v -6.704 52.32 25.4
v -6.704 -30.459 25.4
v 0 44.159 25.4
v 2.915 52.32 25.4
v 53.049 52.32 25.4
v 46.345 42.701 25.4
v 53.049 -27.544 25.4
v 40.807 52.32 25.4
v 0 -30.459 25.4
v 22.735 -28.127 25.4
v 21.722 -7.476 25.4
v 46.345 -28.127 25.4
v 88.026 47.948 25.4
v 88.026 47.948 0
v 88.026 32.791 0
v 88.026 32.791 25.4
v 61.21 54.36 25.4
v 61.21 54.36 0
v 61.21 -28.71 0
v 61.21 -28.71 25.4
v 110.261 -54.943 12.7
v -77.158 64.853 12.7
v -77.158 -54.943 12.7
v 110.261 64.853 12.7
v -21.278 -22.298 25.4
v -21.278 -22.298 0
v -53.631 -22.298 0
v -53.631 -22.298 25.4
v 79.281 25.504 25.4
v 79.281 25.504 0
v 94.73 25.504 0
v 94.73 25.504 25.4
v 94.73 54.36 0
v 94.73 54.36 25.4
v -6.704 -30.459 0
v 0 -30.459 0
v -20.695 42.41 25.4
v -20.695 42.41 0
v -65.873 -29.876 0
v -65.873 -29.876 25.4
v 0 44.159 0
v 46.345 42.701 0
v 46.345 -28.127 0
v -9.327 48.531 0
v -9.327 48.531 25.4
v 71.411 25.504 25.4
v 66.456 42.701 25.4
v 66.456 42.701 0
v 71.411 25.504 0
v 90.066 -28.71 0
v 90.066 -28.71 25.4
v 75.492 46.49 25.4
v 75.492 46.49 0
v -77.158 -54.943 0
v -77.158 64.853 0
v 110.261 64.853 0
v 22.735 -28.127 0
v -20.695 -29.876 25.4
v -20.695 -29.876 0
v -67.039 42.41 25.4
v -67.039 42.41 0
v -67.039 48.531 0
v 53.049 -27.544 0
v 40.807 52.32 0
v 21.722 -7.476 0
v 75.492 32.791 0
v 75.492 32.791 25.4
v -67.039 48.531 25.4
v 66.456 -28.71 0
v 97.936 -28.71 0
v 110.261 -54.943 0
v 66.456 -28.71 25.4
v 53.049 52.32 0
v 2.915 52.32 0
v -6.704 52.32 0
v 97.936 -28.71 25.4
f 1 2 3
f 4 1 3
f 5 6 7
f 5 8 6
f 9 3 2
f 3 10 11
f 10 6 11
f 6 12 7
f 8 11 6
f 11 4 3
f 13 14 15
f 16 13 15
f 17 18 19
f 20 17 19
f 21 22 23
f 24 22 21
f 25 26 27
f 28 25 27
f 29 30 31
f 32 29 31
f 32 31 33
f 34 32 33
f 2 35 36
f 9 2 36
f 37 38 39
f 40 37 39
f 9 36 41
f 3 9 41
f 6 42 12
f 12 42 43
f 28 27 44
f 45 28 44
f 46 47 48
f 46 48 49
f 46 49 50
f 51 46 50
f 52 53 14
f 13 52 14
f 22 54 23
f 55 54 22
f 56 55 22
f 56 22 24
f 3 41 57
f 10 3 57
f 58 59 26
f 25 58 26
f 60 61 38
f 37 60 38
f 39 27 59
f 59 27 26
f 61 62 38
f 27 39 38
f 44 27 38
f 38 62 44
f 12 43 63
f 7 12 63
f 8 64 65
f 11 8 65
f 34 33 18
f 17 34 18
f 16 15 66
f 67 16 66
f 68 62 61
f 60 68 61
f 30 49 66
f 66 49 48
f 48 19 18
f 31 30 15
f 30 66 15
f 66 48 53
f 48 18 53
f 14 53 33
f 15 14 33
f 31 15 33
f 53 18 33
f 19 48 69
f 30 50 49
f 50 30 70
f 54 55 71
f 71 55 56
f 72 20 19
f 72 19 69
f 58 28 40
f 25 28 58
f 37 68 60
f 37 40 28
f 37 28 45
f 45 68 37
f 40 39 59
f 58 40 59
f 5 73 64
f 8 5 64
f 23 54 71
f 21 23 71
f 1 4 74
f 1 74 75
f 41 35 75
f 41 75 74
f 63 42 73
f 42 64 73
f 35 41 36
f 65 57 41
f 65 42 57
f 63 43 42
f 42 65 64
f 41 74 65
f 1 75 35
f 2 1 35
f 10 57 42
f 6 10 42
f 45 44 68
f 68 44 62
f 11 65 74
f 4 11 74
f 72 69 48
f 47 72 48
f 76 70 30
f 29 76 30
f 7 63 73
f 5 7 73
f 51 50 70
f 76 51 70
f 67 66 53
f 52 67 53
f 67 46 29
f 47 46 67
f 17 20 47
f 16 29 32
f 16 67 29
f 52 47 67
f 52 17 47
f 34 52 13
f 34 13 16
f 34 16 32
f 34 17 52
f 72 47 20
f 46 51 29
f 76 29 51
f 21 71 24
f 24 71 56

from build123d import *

# Parameters (mm, degrees)
F3_DEPTH = 25.4
F4_DEPTH = 25.4
F5_DEPTH = 25.4
F6_W     = 187.418692
F6_H     = 119.796396
F7_DEPTH = 12.7


with BuildPart() as f3:
    # F0 (on Top) → F3 (new body)
    with BuildSketch(Plane.XY):
        Polygon((-67.039348, 48.530657), (-67.039348, 42.40967), (-20.694755, 42.40967), (-65.873444, -29.87623), (-20.694755, -29.87623), (-21.277705, -22.297869), (-53.631477, -22.297869), (-9.327213, 48.530657), align=None)
    extrude(amount=F3_DEPTH)


with BuildPart() as f4:
    # F1 (on Top) → F4 (new body)
    with BuildSketch(Plane.XY):
        Polygon((-6.703934, -30.45918), (0, -30.45918), (0, 44.158522), (22.735082, -28.127378), (46.344589, 42.701147), (46.344589, -28.127378), (53.048525, -27.544428), (53.048525, 52.31984), (40.806558, 52.31984), (21.721622, -7.476352), (2.914755, 52.31984), (-6.703934, 52.31984), align=None)
    extrude(amount=F4_DEPTH)


with BuildPart() as f5:
    # F2 (on Top) → F5 (new body)
    with BuildSketch(Plane.XY):
        Polygon((66.456392, -28.710328), (66.456392, 42.701147), (71.411476, 25.504097), (90.065897, -28.710328), (97.935744, -28.710328), (79.281308, 25.504097), (94.729505, 25.504097), (94.729505, 54.360166), (61.209839, 54.360166), (61.209839, -28.710328), align=None)
        Polygon((75.492129, 32.790981), (75.492129, 46.49033), (88.02557, 47.947705), (88.02557, 32.790981), align=None, mode=Mode.SUBTRACT)
    extrude(amount=F5_DEPTH)


with BuildPart() as f7:
    # F6 (on Top) → F7 (new body)
    with BuildSketch(Plane.XY):
        with Locations((16.551647, 4.955083)):
            Rectangle(F6_W, F6_H)
    extrude(amount=F7_DEPTH)


solid = Compound([f3.part, f4.part, f5.part, f7.part])
